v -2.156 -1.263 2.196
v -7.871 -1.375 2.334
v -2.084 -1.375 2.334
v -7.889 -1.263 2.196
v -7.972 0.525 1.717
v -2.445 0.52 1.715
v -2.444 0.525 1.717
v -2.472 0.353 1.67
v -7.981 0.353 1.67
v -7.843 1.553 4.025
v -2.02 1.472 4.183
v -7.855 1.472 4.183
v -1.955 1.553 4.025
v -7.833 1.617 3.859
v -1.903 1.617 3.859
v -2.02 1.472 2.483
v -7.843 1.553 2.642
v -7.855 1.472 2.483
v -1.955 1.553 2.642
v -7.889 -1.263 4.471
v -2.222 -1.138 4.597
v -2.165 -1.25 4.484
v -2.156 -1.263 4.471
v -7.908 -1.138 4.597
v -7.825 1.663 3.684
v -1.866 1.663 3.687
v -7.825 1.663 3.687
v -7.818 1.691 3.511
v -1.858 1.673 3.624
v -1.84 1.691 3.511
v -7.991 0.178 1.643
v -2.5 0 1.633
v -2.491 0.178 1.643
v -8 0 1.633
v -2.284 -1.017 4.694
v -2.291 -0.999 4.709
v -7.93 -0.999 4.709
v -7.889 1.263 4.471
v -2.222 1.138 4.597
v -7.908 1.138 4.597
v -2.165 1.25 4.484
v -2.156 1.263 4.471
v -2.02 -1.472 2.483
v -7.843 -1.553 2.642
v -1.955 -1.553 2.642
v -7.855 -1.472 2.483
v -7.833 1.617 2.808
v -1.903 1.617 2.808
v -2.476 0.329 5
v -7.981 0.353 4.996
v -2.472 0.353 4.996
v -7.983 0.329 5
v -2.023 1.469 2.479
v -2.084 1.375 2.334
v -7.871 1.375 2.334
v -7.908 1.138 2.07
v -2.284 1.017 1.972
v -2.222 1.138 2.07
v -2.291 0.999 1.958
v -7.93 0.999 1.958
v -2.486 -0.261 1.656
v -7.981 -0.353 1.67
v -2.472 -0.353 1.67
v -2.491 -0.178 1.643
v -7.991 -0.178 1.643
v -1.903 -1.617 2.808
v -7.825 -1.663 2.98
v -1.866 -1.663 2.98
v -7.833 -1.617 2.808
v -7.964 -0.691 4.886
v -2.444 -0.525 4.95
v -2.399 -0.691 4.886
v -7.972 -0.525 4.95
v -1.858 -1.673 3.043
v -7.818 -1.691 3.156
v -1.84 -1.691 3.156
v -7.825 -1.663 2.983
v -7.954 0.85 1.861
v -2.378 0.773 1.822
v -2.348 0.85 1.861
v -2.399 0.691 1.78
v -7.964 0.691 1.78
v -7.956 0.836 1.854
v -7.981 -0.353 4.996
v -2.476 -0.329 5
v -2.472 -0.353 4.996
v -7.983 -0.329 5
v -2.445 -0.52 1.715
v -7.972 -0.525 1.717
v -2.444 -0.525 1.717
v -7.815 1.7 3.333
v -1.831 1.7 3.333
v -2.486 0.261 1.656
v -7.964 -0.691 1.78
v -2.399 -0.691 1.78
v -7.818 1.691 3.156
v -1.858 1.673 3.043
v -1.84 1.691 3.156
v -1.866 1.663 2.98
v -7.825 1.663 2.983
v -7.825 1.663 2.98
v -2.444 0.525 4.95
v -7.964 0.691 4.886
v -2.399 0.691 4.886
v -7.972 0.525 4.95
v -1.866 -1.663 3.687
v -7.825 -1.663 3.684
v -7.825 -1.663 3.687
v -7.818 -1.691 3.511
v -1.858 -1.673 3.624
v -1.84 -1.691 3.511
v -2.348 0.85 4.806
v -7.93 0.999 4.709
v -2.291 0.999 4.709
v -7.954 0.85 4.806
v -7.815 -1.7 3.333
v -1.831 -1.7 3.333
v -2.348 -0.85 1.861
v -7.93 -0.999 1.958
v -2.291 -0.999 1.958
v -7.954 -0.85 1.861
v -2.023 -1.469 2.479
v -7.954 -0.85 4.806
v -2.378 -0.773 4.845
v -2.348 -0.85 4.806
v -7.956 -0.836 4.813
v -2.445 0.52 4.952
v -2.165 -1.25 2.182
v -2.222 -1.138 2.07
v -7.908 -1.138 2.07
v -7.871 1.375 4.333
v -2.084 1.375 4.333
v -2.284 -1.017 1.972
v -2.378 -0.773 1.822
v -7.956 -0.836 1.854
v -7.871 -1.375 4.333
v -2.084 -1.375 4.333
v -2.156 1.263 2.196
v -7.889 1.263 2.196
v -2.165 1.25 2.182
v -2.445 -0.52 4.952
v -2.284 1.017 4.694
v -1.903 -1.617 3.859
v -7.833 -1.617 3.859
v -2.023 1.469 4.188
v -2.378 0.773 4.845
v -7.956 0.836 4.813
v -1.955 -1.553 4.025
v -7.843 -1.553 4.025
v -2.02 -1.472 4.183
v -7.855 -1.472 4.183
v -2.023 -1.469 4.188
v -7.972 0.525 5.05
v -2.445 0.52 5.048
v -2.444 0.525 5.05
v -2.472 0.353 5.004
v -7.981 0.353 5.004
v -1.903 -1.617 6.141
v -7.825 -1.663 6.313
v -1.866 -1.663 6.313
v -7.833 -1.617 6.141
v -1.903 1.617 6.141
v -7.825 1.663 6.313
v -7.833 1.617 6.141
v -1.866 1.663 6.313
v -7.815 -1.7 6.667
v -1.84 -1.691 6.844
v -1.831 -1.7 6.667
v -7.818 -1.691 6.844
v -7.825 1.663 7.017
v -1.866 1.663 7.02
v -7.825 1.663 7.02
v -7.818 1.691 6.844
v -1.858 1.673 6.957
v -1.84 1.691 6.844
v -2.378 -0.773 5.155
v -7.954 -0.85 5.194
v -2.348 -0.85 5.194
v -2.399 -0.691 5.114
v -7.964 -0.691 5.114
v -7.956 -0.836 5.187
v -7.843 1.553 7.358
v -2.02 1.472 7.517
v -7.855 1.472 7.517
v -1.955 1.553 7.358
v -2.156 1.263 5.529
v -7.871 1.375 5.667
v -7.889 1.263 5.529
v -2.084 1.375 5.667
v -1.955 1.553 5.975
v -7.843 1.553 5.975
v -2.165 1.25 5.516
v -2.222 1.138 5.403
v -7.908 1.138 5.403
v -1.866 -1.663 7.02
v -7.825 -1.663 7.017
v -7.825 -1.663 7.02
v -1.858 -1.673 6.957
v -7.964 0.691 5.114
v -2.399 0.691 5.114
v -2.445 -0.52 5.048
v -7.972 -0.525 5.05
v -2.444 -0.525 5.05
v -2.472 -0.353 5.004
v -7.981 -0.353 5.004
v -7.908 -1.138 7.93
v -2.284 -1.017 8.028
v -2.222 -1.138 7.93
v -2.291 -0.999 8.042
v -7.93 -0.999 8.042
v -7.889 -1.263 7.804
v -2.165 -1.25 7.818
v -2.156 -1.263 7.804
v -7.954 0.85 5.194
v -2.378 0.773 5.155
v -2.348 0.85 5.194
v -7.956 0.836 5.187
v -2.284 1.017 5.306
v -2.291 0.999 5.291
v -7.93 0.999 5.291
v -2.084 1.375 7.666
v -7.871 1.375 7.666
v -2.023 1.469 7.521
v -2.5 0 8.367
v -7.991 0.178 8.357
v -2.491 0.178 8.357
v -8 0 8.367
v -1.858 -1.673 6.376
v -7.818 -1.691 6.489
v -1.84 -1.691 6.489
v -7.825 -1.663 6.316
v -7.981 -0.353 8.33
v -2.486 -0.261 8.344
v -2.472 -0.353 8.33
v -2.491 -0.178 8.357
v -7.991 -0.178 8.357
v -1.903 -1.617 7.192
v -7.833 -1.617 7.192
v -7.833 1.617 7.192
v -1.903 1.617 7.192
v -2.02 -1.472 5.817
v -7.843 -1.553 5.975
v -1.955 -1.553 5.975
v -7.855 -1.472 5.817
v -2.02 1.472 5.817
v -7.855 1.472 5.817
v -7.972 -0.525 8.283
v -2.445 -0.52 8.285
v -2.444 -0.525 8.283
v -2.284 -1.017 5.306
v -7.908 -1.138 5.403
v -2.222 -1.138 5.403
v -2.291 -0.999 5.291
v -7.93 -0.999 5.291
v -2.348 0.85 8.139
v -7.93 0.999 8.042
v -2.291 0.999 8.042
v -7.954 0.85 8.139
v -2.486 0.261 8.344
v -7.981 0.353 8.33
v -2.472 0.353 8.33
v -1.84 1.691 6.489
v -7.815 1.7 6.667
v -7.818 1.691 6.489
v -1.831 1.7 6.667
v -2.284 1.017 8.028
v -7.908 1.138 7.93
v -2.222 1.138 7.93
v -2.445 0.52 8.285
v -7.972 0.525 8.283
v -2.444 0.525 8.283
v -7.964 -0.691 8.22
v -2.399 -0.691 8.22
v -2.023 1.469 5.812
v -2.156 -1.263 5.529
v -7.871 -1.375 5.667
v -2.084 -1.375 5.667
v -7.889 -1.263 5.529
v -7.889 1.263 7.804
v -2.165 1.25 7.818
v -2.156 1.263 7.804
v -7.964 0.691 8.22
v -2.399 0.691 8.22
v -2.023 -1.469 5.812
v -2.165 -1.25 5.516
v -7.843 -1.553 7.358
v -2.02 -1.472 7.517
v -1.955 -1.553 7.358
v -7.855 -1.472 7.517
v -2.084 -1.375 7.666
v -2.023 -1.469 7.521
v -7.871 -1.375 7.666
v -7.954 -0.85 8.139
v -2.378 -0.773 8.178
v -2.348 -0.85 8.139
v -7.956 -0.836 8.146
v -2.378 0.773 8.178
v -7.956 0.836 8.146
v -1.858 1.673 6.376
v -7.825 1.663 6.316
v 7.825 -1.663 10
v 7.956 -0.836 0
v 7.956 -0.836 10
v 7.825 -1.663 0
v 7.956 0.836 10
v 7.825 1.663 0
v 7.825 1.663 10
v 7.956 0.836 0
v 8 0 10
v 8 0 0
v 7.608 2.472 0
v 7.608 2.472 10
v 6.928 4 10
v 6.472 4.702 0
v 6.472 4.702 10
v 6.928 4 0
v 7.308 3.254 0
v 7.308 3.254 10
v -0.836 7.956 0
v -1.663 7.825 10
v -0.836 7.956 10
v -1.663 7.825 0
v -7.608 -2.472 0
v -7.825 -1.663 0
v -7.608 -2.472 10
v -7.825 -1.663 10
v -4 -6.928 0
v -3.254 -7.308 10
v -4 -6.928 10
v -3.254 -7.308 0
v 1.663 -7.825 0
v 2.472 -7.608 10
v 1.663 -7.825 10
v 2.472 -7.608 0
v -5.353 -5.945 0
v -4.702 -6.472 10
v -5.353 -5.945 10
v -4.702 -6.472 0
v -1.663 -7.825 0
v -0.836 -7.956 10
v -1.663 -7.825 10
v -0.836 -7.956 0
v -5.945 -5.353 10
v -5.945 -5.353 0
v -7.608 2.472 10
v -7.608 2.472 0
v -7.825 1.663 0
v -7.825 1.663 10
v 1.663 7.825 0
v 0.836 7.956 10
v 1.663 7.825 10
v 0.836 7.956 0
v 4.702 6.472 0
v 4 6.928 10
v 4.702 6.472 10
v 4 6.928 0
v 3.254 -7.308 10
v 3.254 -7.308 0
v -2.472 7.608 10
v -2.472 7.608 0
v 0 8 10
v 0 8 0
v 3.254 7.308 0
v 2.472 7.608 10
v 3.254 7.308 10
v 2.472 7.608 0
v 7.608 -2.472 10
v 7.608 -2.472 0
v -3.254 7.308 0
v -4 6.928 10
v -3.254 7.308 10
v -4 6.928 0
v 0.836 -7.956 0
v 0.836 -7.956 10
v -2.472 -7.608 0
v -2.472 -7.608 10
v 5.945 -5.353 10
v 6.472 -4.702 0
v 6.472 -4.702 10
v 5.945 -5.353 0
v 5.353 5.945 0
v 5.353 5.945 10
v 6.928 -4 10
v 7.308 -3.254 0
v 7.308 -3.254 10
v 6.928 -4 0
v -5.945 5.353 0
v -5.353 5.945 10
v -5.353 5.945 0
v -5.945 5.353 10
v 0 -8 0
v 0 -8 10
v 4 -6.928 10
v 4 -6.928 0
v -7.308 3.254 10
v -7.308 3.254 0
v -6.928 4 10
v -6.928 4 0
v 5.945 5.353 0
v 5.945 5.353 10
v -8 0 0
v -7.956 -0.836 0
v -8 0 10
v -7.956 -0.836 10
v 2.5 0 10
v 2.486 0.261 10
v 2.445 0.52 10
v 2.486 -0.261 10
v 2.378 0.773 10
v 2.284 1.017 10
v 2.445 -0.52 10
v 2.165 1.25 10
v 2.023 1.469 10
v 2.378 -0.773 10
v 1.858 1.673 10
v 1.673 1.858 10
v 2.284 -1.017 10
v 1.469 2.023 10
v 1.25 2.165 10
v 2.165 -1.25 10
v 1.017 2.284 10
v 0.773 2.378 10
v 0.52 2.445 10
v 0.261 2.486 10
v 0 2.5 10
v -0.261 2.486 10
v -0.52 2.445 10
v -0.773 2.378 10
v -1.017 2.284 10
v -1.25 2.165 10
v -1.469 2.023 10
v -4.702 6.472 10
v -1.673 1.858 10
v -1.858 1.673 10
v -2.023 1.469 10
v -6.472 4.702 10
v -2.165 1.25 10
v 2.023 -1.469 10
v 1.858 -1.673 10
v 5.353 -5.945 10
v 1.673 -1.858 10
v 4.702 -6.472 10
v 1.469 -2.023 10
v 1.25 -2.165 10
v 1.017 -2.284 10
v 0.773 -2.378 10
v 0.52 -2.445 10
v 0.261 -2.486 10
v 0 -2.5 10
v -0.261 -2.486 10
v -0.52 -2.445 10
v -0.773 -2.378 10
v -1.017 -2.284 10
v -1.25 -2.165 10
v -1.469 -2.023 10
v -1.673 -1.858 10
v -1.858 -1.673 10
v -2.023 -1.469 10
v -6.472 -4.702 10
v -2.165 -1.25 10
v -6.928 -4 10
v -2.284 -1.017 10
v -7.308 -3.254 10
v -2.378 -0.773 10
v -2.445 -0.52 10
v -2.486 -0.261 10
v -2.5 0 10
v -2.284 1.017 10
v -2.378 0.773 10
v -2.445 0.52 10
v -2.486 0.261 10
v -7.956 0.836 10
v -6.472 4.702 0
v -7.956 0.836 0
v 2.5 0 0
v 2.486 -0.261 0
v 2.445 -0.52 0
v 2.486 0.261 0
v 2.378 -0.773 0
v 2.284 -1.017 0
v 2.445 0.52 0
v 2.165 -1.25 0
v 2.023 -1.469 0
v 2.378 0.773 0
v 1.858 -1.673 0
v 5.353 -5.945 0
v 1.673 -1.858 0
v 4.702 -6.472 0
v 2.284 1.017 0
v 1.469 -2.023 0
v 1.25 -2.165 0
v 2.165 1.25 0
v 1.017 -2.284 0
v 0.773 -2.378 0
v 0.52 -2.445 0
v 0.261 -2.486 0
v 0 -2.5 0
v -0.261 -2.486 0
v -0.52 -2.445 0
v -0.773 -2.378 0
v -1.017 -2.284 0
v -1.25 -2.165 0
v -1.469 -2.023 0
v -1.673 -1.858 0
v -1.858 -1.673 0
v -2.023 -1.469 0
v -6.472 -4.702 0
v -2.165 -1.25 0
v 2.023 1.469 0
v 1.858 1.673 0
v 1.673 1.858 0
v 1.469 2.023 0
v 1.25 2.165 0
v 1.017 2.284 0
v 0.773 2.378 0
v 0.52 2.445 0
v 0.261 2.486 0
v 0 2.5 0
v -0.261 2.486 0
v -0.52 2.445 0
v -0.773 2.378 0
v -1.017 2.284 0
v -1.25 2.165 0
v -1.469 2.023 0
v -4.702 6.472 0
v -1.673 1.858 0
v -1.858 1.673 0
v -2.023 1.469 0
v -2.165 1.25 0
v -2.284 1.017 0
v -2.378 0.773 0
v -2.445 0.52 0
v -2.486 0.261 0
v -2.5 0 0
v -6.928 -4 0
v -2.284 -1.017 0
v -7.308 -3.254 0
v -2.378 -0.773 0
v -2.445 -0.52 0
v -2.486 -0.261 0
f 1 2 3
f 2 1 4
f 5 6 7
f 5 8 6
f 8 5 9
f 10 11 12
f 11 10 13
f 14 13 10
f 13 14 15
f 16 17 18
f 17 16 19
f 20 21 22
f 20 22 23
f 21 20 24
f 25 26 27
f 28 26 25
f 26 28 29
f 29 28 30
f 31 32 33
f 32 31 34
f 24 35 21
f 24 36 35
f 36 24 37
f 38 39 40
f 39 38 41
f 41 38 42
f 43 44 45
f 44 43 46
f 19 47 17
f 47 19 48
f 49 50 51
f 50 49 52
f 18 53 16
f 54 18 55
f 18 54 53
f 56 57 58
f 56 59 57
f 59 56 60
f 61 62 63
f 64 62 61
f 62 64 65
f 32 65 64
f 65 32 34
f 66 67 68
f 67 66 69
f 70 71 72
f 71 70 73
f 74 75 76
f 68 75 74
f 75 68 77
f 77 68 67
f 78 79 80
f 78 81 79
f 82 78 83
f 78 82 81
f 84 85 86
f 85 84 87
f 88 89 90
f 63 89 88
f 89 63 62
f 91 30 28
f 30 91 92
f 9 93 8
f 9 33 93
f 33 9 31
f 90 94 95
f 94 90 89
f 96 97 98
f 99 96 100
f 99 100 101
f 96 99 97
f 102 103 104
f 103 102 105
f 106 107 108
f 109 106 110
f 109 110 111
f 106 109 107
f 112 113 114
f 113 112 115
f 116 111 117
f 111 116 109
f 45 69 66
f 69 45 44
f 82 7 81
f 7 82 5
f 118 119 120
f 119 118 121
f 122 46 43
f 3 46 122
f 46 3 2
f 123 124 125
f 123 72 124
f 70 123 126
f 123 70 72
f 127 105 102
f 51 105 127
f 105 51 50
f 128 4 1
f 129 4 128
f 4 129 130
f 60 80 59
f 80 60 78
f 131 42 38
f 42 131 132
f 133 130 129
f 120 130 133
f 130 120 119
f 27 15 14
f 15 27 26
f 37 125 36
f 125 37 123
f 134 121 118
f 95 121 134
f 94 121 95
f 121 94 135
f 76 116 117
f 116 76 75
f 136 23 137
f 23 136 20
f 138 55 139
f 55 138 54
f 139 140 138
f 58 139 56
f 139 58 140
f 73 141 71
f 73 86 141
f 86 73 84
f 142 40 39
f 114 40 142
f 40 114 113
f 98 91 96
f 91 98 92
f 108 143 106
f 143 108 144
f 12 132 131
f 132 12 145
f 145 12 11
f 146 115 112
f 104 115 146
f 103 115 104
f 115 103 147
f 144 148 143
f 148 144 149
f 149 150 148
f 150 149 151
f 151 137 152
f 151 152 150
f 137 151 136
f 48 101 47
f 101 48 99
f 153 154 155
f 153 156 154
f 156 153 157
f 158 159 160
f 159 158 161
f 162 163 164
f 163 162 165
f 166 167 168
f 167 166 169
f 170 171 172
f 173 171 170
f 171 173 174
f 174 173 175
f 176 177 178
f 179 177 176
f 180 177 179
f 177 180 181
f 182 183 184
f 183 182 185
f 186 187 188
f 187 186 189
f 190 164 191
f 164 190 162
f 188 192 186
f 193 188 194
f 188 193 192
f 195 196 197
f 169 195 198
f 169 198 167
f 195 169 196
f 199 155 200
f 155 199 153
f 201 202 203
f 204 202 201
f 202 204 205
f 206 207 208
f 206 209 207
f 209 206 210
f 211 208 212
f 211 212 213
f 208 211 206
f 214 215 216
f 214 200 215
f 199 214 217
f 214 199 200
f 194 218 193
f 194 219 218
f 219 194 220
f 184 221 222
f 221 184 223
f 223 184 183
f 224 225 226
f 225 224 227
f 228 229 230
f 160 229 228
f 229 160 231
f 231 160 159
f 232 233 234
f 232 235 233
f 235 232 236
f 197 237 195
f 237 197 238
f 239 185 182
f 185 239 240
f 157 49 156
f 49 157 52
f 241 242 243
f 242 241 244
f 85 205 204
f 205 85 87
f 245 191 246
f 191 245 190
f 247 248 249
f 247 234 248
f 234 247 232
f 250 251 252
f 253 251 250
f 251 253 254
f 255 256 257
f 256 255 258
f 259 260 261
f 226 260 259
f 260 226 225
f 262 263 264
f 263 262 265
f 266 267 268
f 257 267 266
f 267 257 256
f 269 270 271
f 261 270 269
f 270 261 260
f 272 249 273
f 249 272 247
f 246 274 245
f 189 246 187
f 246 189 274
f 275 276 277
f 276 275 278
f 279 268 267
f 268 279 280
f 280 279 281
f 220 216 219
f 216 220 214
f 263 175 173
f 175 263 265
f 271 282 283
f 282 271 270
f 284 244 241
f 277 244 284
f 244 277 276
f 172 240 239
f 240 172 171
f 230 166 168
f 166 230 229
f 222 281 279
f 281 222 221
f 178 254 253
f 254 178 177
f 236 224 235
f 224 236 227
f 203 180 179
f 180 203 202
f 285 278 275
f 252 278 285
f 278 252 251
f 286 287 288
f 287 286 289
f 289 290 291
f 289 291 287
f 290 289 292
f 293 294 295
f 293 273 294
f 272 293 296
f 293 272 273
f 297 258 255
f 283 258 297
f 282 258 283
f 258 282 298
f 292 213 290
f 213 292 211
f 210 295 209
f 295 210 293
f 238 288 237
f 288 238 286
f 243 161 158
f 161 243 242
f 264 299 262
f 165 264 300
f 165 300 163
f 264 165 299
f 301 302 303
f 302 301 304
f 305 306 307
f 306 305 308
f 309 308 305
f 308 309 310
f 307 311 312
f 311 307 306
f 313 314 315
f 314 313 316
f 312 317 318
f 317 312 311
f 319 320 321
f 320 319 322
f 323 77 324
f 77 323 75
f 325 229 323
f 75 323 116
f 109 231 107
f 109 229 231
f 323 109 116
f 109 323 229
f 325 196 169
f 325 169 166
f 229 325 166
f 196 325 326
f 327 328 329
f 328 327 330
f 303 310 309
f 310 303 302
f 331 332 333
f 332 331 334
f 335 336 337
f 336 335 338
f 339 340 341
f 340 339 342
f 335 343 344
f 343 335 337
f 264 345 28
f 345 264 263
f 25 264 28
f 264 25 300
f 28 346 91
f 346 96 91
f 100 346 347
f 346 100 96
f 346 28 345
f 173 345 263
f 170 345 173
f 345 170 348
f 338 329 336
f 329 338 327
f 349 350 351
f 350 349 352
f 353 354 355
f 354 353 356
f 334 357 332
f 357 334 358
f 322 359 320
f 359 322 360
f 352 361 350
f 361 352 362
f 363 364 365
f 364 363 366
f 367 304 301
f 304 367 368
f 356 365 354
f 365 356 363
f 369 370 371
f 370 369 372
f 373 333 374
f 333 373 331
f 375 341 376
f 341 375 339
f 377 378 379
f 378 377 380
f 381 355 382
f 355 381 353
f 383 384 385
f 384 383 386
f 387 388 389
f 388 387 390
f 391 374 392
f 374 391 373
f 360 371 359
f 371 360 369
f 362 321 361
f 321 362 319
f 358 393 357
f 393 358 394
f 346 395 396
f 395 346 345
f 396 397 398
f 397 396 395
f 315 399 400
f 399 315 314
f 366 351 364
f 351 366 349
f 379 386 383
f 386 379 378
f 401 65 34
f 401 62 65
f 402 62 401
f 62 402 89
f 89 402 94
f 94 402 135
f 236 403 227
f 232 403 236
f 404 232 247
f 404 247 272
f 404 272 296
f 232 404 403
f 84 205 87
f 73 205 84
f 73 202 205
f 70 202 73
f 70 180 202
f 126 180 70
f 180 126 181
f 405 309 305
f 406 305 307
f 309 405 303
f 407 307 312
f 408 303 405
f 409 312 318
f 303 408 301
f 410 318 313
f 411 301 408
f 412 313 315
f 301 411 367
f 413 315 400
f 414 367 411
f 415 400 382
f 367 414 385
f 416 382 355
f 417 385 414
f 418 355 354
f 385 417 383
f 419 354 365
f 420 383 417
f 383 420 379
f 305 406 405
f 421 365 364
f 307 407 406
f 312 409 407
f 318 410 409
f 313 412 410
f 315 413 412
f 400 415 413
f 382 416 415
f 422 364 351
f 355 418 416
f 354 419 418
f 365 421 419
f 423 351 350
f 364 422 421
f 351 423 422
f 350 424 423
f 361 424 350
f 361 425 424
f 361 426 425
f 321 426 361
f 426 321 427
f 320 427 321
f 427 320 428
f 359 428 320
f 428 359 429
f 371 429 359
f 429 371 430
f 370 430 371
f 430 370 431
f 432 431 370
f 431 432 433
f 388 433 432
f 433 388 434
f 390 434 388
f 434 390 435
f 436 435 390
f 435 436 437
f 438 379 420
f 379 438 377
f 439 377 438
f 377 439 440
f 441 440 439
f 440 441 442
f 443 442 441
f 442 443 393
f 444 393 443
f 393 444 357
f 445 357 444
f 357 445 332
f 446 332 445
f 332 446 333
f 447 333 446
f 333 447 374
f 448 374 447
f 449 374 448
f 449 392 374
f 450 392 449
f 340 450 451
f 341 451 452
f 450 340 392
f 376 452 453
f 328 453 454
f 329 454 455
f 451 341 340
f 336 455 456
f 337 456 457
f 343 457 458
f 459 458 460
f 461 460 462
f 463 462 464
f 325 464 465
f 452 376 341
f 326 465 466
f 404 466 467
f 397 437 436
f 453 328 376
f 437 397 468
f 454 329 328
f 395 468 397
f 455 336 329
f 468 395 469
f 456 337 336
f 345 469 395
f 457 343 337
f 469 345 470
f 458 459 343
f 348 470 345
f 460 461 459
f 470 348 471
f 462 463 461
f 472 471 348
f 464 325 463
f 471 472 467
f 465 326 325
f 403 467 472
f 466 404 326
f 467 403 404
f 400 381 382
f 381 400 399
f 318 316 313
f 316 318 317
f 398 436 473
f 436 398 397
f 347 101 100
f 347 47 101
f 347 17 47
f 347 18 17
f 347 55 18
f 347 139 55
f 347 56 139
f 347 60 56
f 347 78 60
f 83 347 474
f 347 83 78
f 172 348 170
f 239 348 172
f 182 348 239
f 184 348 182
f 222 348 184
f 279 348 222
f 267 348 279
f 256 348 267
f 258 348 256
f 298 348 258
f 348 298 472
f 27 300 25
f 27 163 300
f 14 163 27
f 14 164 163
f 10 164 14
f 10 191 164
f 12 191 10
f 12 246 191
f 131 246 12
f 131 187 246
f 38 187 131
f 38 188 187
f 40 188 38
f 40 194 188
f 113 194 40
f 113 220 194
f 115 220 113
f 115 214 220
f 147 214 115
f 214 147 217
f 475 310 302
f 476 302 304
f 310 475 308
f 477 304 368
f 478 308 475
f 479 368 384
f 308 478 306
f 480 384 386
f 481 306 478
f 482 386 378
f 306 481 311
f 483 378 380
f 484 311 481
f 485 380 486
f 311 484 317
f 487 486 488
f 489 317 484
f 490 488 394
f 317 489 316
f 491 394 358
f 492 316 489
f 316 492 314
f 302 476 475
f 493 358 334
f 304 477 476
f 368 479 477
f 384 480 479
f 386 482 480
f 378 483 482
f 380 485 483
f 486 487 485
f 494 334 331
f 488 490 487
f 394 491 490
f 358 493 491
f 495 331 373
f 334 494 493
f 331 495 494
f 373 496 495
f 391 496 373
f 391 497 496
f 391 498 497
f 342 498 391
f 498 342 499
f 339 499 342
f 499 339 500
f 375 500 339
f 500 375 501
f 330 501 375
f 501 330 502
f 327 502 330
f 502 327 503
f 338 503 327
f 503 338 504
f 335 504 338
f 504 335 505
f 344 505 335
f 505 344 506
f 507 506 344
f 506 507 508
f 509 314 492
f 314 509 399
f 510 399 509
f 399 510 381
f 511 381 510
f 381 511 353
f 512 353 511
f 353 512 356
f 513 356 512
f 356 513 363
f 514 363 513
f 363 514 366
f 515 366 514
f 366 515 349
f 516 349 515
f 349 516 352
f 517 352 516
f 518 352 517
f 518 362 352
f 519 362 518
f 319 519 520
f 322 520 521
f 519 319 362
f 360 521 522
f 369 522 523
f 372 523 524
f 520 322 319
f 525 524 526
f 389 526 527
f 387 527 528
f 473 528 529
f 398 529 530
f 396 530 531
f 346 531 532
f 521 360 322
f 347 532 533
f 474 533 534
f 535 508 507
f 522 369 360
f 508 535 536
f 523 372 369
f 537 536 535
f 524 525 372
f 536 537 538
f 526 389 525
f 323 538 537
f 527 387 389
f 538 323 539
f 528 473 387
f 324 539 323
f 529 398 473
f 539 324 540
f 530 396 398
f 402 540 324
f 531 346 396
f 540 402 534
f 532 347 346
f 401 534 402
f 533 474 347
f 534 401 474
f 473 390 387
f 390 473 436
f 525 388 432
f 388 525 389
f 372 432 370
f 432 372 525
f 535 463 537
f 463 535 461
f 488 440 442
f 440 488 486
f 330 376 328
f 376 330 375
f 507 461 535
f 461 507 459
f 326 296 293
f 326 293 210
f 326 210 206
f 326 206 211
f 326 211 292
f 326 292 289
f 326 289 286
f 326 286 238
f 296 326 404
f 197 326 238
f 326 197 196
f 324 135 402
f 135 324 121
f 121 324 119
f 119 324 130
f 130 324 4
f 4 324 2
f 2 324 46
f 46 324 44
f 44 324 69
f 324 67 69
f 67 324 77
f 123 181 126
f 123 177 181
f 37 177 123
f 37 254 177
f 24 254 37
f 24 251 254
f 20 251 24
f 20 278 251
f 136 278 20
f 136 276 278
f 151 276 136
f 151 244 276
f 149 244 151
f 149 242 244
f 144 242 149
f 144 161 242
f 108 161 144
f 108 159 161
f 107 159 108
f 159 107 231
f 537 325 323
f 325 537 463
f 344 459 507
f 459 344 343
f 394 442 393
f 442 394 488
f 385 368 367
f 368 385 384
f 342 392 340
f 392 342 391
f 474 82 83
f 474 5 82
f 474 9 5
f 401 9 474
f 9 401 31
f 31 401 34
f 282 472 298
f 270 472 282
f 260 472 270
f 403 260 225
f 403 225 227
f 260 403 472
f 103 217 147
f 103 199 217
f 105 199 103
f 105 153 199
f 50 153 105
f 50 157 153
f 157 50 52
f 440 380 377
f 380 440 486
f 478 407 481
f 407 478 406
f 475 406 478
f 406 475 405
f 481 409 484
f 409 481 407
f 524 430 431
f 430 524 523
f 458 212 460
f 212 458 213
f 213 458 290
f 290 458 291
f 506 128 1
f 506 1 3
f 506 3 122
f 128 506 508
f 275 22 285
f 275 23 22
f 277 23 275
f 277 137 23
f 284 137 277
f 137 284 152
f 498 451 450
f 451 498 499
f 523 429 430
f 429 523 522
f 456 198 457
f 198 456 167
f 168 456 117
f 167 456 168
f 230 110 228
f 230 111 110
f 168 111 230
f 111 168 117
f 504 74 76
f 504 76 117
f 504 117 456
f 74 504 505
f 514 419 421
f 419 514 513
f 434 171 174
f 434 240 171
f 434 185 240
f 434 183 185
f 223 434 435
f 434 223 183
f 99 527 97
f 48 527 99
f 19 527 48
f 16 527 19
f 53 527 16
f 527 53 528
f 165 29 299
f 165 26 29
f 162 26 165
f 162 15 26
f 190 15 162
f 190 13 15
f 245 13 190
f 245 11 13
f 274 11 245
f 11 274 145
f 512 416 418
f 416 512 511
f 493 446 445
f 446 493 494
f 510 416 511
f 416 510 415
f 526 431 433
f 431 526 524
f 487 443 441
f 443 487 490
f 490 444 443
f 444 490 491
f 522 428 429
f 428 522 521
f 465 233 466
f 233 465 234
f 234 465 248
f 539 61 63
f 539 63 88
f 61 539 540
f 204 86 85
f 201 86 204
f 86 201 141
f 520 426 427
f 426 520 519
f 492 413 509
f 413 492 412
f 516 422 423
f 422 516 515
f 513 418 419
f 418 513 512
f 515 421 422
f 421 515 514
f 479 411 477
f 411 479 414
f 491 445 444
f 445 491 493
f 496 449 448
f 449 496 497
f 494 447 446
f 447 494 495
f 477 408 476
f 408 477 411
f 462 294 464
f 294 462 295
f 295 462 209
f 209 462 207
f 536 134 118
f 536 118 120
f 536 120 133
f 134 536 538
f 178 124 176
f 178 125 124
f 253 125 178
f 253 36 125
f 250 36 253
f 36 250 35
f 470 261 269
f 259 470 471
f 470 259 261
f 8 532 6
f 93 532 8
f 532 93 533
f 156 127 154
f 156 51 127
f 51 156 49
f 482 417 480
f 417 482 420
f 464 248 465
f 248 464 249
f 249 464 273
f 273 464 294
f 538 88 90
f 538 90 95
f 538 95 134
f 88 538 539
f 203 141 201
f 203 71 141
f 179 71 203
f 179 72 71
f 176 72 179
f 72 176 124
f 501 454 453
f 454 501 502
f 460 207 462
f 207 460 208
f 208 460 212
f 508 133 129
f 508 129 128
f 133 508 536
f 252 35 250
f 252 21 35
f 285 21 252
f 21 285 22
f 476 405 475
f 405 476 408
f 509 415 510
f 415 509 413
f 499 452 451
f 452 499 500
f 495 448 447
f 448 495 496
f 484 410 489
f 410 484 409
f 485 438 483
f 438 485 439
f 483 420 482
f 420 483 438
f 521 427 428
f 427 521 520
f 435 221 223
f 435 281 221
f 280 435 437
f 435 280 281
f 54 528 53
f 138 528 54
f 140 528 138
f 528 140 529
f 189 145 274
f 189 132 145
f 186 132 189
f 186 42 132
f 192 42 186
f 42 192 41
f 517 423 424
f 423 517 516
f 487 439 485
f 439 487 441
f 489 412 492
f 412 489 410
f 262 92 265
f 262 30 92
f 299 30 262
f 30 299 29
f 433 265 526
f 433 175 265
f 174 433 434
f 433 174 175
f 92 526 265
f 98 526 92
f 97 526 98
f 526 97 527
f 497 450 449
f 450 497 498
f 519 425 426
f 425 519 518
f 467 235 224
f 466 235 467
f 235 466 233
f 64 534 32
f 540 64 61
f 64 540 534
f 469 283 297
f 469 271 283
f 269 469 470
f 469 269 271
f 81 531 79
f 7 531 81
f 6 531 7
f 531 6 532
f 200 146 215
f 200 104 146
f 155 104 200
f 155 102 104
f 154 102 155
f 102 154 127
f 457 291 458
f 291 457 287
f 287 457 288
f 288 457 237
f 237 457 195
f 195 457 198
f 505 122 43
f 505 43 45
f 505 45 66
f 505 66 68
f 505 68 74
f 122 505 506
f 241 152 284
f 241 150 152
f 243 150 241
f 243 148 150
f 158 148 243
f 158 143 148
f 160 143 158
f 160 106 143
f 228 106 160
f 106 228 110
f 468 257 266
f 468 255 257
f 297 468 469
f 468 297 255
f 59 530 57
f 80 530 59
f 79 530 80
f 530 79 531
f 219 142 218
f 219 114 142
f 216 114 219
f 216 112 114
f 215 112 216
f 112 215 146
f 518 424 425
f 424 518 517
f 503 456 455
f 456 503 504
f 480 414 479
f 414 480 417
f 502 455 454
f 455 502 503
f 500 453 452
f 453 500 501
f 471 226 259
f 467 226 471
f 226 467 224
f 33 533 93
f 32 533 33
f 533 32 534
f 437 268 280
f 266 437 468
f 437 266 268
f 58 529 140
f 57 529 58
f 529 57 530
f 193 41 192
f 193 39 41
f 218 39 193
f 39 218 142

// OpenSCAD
// Double-screw locking collar.
$fn = 60;
eps = 0.02;
shaft_d = 5;
outer_d = 16;
width = 10;
difference() {
    cylinder(d=outer_d,h=width);
    translate([0,0,-eps]) cylinder(d=shaft_d,h=width+2*eps);
    for (z=[width/3,2*width/3]) translate([-outer_d/2-eps,0,z]) rotate([0,90,0]) cylinder(d=3.4,h=outer_d/2+2*eps);
}
